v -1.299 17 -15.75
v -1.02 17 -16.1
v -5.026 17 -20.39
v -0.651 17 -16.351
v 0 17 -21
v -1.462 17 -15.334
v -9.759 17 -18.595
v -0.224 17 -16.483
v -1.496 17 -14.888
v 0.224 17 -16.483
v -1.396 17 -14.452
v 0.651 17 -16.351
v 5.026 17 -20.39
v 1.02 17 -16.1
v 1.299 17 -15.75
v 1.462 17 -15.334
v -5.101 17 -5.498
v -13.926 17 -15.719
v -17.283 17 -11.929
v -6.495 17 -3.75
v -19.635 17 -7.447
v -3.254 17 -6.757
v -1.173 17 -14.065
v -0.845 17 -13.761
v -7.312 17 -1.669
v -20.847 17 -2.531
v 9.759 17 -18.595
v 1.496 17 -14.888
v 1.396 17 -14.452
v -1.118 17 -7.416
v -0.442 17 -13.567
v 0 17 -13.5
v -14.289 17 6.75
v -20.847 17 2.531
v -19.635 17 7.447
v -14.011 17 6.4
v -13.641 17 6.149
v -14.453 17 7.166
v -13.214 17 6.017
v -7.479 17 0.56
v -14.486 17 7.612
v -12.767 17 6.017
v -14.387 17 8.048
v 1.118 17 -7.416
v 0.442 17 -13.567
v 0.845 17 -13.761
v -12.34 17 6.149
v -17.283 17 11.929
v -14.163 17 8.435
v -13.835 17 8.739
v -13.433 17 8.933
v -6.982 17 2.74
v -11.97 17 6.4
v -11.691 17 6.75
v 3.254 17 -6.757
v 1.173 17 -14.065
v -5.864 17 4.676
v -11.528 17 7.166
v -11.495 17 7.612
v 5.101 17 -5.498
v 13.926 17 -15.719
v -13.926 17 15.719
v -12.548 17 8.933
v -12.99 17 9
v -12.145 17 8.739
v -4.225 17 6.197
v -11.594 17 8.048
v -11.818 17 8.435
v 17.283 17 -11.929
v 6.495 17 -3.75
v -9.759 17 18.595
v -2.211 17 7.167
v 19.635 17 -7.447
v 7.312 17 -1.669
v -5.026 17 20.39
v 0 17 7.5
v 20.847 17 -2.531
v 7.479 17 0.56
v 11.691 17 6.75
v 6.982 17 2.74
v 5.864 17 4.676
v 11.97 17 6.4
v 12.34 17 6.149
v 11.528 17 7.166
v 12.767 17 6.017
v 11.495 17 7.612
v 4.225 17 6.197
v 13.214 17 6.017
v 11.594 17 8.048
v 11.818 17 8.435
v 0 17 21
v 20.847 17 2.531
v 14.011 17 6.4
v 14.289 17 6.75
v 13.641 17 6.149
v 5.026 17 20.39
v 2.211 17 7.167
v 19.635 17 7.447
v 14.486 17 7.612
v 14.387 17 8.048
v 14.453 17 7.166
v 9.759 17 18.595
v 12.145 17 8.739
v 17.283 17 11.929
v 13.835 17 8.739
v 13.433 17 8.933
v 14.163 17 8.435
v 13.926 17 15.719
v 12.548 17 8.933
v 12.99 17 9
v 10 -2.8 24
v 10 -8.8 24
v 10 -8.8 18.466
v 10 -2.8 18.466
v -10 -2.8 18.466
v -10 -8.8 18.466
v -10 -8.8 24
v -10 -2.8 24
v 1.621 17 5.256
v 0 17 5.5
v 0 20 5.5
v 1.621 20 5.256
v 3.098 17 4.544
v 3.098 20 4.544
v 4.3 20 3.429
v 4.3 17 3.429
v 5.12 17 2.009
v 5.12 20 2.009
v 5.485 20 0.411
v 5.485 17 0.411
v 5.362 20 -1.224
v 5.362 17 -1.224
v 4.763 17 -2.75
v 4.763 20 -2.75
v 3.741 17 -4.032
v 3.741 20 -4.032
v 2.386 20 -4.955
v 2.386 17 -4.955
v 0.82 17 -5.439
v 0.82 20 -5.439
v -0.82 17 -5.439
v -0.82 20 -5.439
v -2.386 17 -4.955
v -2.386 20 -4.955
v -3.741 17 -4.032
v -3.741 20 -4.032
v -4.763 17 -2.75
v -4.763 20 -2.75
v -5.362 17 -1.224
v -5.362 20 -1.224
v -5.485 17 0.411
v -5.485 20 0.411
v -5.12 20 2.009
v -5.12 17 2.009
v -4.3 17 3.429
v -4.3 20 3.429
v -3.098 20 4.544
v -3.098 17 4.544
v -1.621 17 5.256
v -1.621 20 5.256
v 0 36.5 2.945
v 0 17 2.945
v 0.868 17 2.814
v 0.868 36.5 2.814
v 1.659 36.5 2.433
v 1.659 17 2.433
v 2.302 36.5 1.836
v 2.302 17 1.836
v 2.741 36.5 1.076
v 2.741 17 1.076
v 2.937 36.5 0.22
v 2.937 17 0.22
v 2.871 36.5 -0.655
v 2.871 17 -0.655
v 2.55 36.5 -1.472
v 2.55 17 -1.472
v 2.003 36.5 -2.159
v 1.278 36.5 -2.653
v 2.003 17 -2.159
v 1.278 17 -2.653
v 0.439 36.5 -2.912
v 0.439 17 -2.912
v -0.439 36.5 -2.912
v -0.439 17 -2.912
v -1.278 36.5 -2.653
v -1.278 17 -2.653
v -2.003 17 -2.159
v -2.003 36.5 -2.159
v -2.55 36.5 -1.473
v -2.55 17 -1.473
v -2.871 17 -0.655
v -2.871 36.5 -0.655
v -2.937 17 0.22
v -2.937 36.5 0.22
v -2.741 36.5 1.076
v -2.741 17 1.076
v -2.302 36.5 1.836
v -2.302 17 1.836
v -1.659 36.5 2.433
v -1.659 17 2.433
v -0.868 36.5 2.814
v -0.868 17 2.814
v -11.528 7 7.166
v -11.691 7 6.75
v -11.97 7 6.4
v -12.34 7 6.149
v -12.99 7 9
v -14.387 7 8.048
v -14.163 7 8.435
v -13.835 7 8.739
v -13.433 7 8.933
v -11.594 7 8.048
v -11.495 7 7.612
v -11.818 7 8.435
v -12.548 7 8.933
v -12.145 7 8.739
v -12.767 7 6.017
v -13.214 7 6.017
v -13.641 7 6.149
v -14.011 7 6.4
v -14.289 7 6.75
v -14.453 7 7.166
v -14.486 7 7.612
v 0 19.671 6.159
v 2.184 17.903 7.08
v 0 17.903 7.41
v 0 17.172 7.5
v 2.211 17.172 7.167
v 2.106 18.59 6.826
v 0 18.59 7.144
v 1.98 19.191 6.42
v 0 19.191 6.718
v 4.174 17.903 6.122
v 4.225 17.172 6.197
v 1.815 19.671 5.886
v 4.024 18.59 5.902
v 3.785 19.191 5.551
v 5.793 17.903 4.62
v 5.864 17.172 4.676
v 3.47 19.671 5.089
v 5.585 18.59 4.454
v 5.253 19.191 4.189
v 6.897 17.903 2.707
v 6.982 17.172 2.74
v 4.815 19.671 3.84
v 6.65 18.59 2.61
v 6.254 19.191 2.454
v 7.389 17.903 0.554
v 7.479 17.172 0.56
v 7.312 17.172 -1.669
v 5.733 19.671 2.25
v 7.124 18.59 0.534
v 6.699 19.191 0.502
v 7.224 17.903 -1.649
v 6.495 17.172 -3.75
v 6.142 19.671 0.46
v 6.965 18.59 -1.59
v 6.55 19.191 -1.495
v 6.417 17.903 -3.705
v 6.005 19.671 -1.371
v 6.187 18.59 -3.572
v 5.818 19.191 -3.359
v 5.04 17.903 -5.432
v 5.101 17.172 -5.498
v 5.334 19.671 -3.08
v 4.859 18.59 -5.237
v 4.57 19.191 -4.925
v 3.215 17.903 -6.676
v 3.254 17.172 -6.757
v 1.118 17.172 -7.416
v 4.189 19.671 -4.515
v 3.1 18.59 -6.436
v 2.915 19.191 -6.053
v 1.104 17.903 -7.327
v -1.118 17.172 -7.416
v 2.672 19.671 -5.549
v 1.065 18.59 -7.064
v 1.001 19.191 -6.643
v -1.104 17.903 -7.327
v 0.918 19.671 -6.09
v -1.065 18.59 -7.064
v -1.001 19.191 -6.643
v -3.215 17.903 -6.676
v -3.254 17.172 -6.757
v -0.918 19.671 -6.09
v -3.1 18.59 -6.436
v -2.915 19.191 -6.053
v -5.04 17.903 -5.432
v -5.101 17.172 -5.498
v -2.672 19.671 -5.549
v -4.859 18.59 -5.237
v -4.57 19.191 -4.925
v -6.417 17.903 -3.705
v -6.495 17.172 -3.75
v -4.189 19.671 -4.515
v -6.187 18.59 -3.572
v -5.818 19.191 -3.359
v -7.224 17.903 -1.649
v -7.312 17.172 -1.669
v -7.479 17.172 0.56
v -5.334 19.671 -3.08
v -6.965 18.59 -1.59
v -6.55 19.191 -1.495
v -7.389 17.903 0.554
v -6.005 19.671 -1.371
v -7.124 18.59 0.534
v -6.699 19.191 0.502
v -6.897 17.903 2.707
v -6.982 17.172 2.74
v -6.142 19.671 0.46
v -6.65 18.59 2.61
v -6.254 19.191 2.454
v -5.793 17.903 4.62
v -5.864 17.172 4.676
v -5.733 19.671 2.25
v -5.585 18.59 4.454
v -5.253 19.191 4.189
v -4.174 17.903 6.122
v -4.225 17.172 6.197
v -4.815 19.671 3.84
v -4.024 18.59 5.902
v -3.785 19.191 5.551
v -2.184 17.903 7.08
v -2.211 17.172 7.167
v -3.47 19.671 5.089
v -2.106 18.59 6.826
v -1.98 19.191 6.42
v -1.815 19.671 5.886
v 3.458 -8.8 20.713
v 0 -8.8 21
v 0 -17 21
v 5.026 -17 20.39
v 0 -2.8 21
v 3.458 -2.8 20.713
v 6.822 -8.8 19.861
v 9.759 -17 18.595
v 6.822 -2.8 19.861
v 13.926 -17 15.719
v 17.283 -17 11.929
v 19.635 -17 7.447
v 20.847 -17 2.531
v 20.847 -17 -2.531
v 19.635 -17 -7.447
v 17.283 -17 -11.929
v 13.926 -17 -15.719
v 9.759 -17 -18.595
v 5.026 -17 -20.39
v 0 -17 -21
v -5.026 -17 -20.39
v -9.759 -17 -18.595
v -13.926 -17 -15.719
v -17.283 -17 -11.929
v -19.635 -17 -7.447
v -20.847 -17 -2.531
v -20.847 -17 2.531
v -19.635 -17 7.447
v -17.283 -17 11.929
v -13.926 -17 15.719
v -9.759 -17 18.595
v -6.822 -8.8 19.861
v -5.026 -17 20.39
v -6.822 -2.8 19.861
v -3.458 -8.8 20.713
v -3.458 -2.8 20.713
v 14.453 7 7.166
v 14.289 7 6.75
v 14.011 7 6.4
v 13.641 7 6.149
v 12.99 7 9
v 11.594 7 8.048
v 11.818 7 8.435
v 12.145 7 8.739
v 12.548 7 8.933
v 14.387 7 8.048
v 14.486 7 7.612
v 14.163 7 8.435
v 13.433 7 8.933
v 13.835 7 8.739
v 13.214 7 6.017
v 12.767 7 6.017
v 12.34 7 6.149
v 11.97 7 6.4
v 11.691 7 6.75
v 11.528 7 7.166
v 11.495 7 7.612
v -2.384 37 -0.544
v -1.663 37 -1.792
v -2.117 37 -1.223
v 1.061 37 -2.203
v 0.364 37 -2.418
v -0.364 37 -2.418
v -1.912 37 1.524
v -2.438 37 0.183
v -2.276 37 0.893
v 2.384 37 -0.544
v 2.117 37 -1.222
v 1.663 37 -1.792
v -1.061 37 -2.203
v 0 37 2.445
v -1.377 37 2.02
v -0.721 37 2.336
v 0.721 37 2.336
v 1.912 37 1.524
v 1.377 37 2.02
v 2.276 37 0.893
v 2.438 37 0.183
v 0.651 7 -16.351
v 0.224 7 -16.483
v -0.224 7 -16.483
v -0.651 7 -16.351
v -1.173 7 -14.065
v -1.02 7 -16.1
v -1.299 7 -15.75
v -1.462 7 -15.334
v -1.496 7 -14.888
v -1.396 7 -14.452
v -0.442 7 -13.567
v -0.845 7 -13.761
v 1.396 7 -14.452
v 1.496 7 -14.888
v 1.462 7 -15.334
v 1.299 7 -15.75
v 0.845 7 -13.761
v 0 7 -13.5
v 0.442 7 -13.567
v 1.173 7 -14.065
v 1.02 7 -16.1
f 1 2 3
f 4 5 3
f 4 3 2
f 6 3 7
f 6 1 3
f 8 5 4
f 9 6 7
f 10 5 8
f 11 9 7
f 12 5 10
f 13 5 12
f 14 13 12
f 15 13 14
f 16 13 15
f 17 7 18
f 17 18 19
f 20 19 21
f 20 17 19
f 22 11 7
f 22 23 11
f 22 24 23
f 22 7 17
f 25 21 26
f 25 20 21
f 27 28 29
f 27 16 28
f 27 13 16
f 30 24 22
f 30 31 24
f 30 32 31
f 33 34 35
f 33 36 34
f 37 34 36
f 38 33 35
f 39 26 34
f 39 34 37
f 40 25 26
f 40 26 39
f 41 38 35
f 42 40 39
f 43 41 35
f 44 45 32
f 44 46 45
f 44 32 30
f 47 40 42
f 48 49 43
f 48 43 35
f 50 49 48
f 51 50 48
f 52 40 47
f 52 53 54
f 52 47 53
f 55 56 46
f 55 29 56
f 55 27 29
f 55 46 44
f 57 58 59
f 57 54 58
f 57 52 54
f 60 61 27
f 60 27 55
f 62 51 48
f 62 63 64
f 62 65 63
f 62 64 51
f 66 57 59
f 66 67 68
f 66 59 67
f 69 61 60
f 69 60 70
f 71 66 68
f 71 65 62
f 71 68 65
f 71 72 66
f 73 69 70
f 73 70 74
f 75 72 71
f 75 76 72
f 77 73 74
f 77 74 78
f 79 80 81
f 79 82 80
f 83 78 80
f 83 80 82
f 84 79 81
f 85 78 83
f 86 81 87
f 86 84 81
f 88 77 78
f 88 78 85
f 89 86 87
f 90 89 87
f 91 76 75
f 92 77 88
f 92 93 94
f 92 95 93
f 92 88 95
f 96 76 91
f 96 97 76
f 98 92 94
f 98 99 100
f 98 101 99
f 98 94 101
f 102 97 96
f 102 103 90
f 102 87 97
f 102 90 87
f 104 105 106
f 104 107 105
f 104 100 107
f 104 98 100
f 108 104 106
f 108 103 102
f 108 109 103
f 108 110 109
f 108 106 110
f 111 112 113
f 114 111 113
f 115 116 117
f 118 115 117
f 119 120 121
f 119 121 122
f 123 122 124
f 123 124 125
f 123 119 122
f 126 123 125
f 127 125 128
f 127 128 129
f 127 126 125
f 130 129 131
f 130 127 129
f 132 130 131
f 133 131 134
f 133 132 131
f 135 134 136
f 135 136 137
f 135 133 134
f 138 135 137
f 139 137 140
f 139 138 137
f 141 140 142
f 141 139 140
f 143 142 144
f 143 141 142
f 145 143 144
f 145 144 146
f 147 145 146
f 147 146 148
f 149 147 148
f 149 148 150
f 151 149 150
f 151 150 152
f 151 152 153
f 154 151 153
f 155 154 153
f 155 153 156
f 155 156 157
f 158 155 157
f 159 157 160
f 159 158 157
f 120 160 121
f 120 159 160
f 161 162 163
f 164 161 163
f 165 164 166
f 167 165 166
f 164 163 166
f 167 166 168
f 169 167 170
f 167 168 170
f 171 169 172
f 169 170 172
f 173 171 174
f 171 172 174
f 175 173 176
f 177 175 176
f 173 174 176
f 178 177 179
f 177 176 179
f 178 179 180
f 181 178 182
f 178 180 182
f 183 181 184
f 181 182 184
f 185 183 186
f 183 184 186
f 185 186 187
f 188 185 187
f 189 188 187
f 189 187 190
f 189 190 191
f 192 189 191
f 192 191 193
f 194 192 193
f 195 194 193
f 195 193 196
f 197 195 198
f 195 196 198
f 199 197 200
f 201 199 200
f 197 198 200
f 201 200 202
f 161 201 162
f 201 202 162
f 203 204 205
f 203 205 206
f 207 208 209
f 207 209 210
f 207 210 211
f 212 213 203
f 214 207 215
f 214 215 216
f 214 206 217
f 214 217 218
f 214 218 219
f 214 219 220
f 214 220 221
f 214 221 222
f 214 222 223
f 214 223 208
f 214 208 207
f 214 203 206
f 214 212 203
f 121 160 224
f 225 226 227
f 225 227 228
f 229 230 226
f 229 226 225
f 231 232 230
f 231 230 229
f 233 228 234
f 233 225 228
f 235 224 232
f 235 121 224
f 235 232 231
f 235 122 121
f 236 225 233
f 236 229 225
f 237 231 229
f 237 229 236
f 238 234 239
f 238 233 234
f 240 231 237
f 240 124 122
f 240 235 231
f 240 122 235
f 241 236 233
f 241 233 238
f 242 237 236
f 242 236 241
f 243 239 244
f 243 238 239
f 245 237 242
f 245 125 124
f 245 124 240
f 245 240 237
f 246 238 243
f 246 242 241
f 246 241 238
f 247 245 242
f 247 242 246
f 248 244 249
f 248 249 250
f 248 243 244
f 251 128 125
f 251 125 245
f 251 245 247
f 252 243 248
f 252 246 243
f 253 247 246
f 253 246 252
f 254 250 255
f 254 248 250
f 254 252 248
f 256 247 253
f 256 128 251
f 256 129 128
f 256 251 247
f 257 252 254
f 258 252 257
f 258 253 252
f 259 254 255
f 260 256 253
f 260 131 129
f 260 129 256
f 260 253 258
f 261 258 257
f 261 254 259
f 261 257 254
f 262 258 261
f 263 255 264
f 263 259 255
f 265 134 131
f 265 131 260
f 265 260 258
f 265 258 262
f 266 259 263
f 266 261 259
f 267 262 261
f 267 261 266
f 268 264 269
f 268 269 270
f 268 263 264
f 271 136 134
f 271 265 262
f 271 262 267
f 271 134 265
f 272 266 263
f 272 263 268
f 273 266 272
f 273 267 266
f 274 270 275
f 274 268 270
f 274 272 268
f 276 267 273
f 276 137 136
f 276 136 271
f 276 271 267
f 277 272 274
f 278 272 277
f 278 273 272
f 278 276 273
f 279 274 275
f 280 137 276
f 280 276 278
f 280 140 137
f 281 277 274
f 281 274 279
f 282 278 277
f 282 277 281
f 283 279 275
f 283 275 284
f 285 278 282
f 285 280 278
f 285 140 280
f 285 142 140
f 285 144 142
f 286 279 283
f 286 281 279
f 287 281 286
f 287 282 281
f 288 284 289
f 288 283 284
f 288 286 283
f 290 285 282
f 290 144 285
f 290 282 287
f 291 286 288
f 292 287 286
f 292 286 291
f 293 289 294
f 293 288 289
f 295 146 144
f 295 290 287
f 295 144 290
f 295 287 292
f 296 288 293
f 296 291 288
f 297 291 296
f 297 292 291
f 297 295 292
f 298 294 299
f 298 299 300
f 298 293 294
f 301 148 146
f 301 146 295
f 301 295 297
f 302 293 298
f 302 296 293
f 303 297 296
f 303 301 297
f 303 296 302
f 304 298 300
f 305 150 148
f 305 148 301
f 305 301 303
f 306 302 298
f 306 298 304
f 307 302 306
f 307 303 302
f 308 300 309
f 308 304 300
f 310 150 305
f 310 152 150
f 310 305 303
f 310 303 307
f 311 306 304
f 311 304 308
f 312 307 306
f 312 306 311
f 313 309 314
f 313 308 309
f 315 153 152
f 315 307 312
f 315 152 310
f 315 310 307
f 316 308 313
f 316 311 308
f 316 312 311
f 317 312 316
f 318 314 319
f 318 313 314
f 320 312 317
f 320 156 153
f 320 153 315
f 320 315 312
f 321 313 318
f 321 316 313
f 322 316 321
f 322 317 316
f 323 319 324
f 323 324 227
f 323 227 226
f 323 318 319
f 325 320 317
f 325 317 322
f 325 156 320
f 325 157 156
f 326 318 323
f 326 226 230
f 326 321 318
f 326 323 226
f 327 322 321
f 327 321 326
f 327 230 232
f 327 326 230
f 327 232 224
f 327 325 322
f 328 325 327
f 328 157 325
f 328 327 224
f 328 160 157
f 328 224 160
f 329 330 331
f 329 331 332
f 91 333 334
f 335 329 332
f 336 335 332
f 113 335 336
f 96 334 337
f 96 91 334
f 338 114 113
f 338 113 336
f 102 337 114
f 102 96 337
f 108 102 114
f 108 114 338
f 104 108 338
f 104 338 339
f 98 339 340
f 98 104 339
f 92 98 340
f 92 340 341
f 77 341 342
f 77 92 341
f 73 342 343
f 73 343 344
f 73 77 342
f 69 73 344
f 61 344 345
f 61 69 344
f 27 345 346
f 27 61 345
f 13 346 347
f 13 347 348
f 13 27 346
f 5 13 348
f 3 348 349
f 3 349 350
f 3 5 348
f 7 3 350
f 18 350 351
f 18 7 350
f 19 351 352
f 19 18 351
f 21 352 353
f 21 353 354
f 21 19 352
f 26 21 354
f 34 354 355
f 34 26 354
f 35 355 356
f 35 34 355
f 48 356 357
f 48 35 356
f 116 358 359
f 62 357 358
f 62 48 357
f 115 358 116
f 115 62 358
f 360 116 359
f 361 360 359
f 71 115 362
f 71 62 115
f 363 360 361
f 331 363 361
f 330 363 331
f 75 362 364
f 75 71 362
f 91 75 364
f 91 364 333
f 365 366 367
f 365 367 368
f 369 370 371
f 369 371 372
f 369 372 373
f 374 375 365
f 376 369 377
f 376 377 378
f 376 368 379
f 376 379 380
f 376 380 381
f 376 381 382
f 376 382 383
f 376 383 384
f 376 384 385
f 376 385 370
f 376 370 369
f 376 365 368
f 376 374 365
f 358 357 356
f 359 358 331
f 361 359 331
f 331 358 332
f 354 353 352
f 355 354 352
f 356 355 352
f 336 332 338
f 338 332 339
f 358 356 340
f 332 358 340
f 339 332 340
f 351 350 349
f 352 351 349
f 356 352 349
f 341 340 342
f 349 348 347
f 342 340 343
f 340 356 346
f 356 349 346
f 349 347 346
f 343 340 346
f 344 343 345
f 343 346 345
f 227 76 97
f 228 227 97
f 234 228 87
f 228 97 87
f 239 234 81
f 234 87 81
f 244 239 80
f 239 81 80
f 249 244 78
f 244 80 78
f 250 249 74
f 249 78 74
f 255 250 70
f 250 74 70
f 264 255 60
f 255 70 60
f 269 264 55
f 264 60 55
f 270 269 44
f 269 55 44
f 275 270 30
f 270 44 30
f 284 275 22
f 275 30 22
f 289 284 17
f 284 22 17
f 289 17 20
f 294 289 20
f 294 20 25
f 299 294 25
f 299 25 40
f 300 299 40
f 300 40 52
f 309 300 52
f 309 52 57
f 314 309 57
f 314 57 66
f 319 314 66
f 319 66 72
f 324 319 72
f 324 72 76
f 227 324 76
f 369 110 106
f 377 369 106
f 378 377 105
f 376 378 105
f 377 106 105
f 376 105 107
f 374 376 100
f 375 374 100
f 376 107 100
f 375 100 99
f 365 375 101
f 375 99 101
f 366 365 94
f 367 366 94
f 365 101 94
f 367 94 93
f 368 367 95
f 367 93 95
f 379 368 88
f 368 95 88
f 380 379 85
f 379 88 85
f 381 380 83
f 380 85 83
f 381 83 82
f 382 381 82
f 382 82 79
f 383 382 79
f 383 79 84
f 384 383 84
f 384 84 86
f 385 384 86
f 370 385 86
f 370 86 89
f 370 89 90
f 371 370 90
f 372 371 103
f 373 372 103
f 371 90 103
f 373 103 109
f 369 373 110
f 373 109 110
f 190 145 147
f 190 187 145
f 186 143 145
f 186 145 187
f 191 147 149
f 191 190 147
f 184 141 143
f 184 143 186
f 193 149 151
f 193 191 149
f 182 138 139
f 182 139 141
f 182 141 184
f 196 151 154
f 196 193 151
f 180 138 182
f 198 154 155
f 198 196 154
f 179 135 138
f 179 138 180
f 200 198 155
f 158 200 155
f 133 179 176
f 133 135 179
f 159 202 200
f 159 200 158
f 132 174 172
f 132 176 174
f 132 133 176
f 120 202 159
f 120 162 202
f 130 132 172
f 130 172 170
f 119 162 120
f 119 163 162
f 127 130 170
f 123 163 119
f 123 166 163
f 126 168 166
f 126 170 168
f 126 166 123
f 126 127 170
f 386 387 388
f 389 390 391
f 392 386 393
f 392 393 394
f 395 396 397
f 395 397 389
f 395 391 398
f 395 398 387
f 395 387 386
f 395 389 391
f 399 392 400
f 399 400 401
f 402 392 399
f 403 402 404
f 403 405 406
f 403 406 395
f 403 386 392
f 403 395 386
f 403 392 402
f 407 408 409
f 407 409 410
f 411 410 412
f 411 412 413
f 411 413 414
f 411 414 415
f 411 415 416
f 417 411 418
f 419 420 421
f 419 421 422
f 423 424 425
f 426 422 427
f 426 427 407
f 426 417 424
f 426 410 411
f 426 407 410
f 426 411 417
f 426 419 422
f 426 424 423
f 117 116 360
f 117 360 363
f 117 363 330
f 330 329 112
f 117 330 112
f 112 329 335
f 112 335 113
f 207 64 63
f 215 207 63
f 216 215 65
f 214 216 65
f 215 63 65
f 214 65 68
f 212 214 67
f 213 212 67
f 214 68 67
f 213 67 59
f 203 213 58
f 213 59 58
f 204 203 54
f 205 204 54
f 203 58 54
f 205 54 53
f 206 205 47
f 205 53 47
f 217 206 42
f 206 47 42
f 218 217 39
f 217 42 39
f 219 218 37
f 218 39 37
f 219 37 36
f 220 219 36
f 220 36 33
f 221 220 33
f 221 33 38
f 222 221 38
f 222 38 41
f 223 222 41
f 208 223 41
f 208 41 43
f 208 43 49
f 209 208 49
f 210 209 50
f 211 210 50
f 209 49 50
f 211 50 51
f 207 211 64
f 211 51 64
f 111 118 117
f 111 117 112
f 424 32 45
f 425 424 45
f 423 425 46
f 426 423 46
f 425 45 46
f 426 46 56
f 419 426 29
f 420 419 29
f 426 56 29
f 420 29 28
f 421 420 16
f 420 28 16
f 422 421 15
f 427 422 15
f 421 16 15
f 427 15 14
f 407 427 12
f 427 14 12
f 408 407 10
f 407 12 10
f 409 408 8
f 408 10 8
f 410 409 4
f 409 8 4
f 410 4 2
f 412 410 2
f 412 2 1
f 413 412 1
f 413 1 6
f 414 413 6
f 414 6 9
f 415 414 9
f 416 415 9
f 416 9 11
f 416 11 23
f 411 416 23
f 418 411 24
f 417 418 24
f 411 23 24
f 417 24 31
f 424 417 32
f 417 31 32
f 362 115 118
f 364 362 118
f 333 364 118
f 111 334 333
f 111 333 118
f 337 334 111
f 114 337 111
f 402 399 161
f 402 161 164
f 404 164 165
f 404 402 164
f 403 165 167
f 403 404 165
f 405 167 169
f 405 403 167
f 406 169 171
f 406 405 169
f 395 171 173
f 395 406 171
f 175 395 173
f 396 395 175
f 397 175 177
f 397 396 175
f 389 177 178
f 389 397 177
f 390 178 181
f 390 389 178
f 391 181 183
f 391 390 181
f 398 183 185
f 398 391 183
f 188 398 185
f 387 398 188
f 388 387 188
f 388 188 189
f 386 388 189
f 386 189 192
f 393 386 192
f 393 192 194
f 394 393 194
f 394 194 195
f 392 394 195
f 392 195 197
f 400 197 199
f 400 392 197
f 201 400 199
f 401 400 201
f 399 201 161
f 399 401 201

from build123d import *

# Parameters (mm, degrees)
SKETCH1_R           = 21
SKETCH1_R_2         = 1.5
SKETCH1_R_3         = 7.5
SKETCH1_R_4         = 5.5
SKETCH1_R_5         = 2.945
BOSS_EXTRUDE1_DEPTH = 17
CUT_EXTRUDE1_START  = 17
SKETCH1_3_R         = 1.5
CUT_EXTRUDE1_DEPTH  = 10
BOSS_EXTRUDE2_START = 17
SKETCH1_4_R         = 7.5
SKETCH1_4_R_2       = 5.5
BOSS_EXTRUDE2_DEPTH = 3
FILLET1_R           = 3
BOSS_EXTRUDE3_START = 17
SKETCH1_5_R         = 2.945
BOSS_EXTRUDE3_DEPTH = 20
BOSS_EXTRUDE4_START = -2.8
BOSS_EXTRUDE4_DEPTH = 6
CHAMFER1_SIZE       = 0.5


with BuildPart() as part:
    # Sketch1 → Boss-Extrude1 (new, symmetric)
    # profile 1 of 7: a face of its own
    with BuildSketch(Plane(origin=(0, 0, 0), x_dir=(1, 0, 0), z_dir=(0, 1, 0))):
        with Locations(Location((0, 0, 0), (0, 0, 270))):
            Circle(SKETCH1_R)
        with Locations((12.990381057, -7.5)):
            Circle(SKETCH1_R_2, mode=Mode.SUBTRACT)
        with Locations((-12.990381057, -7.5)):
            Circle(SKETCH1_R_2, mode=Mode.SUBTRACT)
        with Locations((0, 15)):
            Circle(SKETCH1_R_2, mode=Mode.SUBTRACT)
        Circle(SKETCH1_R_3, mode=Mode.SUBTRACT)
    # profile 2 of 7: a face of its own
    with BuildSketch(Plane(origin=(0, 0, 0), x_dir=(1, 0, 0), z_dir=(0, 1, 0))):
        Circle(SKETCH1_R_3)
        Circle(SKETCH1_R_4, mode=Mode.SUBTRACT)
    # profile 3 of 7: a face of its own
    with BuildSketch(Plane(origin=(0, 0, 0), x_dir=(1, 0, 0), z_dir=(0, 1, 0))):
        Circle(SKETCH1_R_4)
        Circle(SKETCH1_R_5, mode=Mode.SUBTRACT)
    # profile 4 of 7: a face of its own
    with BuildSketch(Plane(origin=(0, 0, 0), x_dir=(1, 0, 0), z_dir=(0, 1, 0))):
        Circle(SKETCH1_R_5)
    # profile 5 of 7: a face of its own
    with BuildSketch(Plane(origin=(0, 0, 0), x_dir=(1, 0, 0), z_dir=(0, 1, 0))):
        with Locations((-12.990381057, -7.5)):
            Circle(SKETCH1_R_2)
    # profile 6 of 7: a face of its own
    with BuildSketch(Plane(origin=(0, 0, 0), x_dir=(1, 0, 0), z_dir=(0, 1, 0))):
        with Locations((12.990381057, -7.5)):
            Circle(SKETCH1_R_2)
    # profile 7 of 7: a face of its own
    with BuildSketch(Plane(origin=(0, 0, 0), x_dir=(1, 0, 0), z_dir=(0, 1, 0))):
        with Locations((0, 15)):
            Circle(SKETCH1_R_2)
    extrude(amount=BOSS_EXTRUDE1_DEPTH, both=True)

    # Sketch1<3> → Cut-Extrude1 (cut)
    with BuildSketch(Plane(origin=(0, 0, 0), x_dir=(1, 0, 0), z_dir=(0, 1, 0)).offset(CUT_EXTRUDE1_START)):
        with Locations(Location((-12.990381057, -7.5, 0), (0, 0, 270))):
            Circle(SKETCH1_3_R)
        with Locations(Location((12.990381057, -7.5, 0), (0, 0, 270))):
            Circle(SKETCH1_3_R)
        with Locations(Location((0, 15, 0), (0, 0, 270))):
            Circle(SKETCH1_3_R)
    extrude(amount=-CUT_EXTRUDE1_DEPTH, mode=Mode.SUBTRACT)

    # Sketch1<4> → Boss-Extrude2 (add)
    with BuildSketch(Plane(origin=(0, 0, 0), x_dir=(1, 0, 0), z_dir=(0, 1, 0)).offset(BOSS_EXTRUDE2_START)):
        with Locations(Location((0, 0, 0), (0, 0, 270))):
            Circle(SKETCH1_4_R)
        with Locations(Location((0, 0, 0), (0, 0, 270))):
            Circle(SKETCH1_4_R_2, mode=Mode.SUBTRACT)
    extrude(amount=BOSS_EXTRUDE2_DEPTH)

    # Fillet1
    # the kernel refuses this fillet: 3 mm, written as the material it takes off along each edge
    with BuildSketch(Plane(origin=(0, 20, 0), x_dir=(0, 0, 1), z_dir=(-1, 0, 0))) as fillet1_piece_1:
        with BuildLine():
            CenterArc((4.5, -2.828427125), FILLET1_R, 0, 70.528779366)
            Line((5.5, 0), (5.52, 0.056568542))
            ThreePointArc((5.52, 0.056568542), (6.5, 0.06), (7.5, 0.06))
            Line((7.5, 0.06), (7.56, 0))
            Line((7.56, 0), (7.56, -2.828427125))
            Line((7.56, -2.828427125), (7.5, -2.828427125))
        make_face()
    revolve(axis=Axis((0, 20, 0), (0, 1, 0)), mode=Mode.SUBTRACT)

    # Sketch1<5> → Boss-Extrude3 (add)
    with BuildSketch(Plane(origin=(0, 0, 0), x_dir=(1, 0, 0), z_dir=(0, 1, 0)).offset(BOSS_EXTRUDE3_START)):
        with Locations(Location((0, 0, 0), (0, 0, 270))):
            Circle(SKETCH1_5_R)
    extrude(amount=BOSS_EXTRUDE3_DEPTH)

    # Sketch1<8> → Boss-Extrude4 (add)
    with BuildSketch(Plane(origin=(0, 0, 0), x_dir=(1, 0, 0), z_dir=(0, 1, 0)).offset(BOSS_EXTRUDE4_START)):
        with BuildLine():
            ThreePointArc((10, -18.466185313), (0, -21), (-10, -18.466185313))
            Line((-10, -18.466185313), (-10, -24))
            Line((-10, -24), (10, -24))
            Line((10, -24), (10, -18.466185313))
        make_face()
    extrude(amount=-BOSS_EXTRUDE4_DEPTH)

    # Chamfer1
    chamfer1_edges = [part.edges().sort_by_distance(p)[0] for p in [
        (0, 37, -2.945),
    ]]
    chamfer(chamfer1_edges, length=CHAMFER1_SIZE)


solid = part.part
